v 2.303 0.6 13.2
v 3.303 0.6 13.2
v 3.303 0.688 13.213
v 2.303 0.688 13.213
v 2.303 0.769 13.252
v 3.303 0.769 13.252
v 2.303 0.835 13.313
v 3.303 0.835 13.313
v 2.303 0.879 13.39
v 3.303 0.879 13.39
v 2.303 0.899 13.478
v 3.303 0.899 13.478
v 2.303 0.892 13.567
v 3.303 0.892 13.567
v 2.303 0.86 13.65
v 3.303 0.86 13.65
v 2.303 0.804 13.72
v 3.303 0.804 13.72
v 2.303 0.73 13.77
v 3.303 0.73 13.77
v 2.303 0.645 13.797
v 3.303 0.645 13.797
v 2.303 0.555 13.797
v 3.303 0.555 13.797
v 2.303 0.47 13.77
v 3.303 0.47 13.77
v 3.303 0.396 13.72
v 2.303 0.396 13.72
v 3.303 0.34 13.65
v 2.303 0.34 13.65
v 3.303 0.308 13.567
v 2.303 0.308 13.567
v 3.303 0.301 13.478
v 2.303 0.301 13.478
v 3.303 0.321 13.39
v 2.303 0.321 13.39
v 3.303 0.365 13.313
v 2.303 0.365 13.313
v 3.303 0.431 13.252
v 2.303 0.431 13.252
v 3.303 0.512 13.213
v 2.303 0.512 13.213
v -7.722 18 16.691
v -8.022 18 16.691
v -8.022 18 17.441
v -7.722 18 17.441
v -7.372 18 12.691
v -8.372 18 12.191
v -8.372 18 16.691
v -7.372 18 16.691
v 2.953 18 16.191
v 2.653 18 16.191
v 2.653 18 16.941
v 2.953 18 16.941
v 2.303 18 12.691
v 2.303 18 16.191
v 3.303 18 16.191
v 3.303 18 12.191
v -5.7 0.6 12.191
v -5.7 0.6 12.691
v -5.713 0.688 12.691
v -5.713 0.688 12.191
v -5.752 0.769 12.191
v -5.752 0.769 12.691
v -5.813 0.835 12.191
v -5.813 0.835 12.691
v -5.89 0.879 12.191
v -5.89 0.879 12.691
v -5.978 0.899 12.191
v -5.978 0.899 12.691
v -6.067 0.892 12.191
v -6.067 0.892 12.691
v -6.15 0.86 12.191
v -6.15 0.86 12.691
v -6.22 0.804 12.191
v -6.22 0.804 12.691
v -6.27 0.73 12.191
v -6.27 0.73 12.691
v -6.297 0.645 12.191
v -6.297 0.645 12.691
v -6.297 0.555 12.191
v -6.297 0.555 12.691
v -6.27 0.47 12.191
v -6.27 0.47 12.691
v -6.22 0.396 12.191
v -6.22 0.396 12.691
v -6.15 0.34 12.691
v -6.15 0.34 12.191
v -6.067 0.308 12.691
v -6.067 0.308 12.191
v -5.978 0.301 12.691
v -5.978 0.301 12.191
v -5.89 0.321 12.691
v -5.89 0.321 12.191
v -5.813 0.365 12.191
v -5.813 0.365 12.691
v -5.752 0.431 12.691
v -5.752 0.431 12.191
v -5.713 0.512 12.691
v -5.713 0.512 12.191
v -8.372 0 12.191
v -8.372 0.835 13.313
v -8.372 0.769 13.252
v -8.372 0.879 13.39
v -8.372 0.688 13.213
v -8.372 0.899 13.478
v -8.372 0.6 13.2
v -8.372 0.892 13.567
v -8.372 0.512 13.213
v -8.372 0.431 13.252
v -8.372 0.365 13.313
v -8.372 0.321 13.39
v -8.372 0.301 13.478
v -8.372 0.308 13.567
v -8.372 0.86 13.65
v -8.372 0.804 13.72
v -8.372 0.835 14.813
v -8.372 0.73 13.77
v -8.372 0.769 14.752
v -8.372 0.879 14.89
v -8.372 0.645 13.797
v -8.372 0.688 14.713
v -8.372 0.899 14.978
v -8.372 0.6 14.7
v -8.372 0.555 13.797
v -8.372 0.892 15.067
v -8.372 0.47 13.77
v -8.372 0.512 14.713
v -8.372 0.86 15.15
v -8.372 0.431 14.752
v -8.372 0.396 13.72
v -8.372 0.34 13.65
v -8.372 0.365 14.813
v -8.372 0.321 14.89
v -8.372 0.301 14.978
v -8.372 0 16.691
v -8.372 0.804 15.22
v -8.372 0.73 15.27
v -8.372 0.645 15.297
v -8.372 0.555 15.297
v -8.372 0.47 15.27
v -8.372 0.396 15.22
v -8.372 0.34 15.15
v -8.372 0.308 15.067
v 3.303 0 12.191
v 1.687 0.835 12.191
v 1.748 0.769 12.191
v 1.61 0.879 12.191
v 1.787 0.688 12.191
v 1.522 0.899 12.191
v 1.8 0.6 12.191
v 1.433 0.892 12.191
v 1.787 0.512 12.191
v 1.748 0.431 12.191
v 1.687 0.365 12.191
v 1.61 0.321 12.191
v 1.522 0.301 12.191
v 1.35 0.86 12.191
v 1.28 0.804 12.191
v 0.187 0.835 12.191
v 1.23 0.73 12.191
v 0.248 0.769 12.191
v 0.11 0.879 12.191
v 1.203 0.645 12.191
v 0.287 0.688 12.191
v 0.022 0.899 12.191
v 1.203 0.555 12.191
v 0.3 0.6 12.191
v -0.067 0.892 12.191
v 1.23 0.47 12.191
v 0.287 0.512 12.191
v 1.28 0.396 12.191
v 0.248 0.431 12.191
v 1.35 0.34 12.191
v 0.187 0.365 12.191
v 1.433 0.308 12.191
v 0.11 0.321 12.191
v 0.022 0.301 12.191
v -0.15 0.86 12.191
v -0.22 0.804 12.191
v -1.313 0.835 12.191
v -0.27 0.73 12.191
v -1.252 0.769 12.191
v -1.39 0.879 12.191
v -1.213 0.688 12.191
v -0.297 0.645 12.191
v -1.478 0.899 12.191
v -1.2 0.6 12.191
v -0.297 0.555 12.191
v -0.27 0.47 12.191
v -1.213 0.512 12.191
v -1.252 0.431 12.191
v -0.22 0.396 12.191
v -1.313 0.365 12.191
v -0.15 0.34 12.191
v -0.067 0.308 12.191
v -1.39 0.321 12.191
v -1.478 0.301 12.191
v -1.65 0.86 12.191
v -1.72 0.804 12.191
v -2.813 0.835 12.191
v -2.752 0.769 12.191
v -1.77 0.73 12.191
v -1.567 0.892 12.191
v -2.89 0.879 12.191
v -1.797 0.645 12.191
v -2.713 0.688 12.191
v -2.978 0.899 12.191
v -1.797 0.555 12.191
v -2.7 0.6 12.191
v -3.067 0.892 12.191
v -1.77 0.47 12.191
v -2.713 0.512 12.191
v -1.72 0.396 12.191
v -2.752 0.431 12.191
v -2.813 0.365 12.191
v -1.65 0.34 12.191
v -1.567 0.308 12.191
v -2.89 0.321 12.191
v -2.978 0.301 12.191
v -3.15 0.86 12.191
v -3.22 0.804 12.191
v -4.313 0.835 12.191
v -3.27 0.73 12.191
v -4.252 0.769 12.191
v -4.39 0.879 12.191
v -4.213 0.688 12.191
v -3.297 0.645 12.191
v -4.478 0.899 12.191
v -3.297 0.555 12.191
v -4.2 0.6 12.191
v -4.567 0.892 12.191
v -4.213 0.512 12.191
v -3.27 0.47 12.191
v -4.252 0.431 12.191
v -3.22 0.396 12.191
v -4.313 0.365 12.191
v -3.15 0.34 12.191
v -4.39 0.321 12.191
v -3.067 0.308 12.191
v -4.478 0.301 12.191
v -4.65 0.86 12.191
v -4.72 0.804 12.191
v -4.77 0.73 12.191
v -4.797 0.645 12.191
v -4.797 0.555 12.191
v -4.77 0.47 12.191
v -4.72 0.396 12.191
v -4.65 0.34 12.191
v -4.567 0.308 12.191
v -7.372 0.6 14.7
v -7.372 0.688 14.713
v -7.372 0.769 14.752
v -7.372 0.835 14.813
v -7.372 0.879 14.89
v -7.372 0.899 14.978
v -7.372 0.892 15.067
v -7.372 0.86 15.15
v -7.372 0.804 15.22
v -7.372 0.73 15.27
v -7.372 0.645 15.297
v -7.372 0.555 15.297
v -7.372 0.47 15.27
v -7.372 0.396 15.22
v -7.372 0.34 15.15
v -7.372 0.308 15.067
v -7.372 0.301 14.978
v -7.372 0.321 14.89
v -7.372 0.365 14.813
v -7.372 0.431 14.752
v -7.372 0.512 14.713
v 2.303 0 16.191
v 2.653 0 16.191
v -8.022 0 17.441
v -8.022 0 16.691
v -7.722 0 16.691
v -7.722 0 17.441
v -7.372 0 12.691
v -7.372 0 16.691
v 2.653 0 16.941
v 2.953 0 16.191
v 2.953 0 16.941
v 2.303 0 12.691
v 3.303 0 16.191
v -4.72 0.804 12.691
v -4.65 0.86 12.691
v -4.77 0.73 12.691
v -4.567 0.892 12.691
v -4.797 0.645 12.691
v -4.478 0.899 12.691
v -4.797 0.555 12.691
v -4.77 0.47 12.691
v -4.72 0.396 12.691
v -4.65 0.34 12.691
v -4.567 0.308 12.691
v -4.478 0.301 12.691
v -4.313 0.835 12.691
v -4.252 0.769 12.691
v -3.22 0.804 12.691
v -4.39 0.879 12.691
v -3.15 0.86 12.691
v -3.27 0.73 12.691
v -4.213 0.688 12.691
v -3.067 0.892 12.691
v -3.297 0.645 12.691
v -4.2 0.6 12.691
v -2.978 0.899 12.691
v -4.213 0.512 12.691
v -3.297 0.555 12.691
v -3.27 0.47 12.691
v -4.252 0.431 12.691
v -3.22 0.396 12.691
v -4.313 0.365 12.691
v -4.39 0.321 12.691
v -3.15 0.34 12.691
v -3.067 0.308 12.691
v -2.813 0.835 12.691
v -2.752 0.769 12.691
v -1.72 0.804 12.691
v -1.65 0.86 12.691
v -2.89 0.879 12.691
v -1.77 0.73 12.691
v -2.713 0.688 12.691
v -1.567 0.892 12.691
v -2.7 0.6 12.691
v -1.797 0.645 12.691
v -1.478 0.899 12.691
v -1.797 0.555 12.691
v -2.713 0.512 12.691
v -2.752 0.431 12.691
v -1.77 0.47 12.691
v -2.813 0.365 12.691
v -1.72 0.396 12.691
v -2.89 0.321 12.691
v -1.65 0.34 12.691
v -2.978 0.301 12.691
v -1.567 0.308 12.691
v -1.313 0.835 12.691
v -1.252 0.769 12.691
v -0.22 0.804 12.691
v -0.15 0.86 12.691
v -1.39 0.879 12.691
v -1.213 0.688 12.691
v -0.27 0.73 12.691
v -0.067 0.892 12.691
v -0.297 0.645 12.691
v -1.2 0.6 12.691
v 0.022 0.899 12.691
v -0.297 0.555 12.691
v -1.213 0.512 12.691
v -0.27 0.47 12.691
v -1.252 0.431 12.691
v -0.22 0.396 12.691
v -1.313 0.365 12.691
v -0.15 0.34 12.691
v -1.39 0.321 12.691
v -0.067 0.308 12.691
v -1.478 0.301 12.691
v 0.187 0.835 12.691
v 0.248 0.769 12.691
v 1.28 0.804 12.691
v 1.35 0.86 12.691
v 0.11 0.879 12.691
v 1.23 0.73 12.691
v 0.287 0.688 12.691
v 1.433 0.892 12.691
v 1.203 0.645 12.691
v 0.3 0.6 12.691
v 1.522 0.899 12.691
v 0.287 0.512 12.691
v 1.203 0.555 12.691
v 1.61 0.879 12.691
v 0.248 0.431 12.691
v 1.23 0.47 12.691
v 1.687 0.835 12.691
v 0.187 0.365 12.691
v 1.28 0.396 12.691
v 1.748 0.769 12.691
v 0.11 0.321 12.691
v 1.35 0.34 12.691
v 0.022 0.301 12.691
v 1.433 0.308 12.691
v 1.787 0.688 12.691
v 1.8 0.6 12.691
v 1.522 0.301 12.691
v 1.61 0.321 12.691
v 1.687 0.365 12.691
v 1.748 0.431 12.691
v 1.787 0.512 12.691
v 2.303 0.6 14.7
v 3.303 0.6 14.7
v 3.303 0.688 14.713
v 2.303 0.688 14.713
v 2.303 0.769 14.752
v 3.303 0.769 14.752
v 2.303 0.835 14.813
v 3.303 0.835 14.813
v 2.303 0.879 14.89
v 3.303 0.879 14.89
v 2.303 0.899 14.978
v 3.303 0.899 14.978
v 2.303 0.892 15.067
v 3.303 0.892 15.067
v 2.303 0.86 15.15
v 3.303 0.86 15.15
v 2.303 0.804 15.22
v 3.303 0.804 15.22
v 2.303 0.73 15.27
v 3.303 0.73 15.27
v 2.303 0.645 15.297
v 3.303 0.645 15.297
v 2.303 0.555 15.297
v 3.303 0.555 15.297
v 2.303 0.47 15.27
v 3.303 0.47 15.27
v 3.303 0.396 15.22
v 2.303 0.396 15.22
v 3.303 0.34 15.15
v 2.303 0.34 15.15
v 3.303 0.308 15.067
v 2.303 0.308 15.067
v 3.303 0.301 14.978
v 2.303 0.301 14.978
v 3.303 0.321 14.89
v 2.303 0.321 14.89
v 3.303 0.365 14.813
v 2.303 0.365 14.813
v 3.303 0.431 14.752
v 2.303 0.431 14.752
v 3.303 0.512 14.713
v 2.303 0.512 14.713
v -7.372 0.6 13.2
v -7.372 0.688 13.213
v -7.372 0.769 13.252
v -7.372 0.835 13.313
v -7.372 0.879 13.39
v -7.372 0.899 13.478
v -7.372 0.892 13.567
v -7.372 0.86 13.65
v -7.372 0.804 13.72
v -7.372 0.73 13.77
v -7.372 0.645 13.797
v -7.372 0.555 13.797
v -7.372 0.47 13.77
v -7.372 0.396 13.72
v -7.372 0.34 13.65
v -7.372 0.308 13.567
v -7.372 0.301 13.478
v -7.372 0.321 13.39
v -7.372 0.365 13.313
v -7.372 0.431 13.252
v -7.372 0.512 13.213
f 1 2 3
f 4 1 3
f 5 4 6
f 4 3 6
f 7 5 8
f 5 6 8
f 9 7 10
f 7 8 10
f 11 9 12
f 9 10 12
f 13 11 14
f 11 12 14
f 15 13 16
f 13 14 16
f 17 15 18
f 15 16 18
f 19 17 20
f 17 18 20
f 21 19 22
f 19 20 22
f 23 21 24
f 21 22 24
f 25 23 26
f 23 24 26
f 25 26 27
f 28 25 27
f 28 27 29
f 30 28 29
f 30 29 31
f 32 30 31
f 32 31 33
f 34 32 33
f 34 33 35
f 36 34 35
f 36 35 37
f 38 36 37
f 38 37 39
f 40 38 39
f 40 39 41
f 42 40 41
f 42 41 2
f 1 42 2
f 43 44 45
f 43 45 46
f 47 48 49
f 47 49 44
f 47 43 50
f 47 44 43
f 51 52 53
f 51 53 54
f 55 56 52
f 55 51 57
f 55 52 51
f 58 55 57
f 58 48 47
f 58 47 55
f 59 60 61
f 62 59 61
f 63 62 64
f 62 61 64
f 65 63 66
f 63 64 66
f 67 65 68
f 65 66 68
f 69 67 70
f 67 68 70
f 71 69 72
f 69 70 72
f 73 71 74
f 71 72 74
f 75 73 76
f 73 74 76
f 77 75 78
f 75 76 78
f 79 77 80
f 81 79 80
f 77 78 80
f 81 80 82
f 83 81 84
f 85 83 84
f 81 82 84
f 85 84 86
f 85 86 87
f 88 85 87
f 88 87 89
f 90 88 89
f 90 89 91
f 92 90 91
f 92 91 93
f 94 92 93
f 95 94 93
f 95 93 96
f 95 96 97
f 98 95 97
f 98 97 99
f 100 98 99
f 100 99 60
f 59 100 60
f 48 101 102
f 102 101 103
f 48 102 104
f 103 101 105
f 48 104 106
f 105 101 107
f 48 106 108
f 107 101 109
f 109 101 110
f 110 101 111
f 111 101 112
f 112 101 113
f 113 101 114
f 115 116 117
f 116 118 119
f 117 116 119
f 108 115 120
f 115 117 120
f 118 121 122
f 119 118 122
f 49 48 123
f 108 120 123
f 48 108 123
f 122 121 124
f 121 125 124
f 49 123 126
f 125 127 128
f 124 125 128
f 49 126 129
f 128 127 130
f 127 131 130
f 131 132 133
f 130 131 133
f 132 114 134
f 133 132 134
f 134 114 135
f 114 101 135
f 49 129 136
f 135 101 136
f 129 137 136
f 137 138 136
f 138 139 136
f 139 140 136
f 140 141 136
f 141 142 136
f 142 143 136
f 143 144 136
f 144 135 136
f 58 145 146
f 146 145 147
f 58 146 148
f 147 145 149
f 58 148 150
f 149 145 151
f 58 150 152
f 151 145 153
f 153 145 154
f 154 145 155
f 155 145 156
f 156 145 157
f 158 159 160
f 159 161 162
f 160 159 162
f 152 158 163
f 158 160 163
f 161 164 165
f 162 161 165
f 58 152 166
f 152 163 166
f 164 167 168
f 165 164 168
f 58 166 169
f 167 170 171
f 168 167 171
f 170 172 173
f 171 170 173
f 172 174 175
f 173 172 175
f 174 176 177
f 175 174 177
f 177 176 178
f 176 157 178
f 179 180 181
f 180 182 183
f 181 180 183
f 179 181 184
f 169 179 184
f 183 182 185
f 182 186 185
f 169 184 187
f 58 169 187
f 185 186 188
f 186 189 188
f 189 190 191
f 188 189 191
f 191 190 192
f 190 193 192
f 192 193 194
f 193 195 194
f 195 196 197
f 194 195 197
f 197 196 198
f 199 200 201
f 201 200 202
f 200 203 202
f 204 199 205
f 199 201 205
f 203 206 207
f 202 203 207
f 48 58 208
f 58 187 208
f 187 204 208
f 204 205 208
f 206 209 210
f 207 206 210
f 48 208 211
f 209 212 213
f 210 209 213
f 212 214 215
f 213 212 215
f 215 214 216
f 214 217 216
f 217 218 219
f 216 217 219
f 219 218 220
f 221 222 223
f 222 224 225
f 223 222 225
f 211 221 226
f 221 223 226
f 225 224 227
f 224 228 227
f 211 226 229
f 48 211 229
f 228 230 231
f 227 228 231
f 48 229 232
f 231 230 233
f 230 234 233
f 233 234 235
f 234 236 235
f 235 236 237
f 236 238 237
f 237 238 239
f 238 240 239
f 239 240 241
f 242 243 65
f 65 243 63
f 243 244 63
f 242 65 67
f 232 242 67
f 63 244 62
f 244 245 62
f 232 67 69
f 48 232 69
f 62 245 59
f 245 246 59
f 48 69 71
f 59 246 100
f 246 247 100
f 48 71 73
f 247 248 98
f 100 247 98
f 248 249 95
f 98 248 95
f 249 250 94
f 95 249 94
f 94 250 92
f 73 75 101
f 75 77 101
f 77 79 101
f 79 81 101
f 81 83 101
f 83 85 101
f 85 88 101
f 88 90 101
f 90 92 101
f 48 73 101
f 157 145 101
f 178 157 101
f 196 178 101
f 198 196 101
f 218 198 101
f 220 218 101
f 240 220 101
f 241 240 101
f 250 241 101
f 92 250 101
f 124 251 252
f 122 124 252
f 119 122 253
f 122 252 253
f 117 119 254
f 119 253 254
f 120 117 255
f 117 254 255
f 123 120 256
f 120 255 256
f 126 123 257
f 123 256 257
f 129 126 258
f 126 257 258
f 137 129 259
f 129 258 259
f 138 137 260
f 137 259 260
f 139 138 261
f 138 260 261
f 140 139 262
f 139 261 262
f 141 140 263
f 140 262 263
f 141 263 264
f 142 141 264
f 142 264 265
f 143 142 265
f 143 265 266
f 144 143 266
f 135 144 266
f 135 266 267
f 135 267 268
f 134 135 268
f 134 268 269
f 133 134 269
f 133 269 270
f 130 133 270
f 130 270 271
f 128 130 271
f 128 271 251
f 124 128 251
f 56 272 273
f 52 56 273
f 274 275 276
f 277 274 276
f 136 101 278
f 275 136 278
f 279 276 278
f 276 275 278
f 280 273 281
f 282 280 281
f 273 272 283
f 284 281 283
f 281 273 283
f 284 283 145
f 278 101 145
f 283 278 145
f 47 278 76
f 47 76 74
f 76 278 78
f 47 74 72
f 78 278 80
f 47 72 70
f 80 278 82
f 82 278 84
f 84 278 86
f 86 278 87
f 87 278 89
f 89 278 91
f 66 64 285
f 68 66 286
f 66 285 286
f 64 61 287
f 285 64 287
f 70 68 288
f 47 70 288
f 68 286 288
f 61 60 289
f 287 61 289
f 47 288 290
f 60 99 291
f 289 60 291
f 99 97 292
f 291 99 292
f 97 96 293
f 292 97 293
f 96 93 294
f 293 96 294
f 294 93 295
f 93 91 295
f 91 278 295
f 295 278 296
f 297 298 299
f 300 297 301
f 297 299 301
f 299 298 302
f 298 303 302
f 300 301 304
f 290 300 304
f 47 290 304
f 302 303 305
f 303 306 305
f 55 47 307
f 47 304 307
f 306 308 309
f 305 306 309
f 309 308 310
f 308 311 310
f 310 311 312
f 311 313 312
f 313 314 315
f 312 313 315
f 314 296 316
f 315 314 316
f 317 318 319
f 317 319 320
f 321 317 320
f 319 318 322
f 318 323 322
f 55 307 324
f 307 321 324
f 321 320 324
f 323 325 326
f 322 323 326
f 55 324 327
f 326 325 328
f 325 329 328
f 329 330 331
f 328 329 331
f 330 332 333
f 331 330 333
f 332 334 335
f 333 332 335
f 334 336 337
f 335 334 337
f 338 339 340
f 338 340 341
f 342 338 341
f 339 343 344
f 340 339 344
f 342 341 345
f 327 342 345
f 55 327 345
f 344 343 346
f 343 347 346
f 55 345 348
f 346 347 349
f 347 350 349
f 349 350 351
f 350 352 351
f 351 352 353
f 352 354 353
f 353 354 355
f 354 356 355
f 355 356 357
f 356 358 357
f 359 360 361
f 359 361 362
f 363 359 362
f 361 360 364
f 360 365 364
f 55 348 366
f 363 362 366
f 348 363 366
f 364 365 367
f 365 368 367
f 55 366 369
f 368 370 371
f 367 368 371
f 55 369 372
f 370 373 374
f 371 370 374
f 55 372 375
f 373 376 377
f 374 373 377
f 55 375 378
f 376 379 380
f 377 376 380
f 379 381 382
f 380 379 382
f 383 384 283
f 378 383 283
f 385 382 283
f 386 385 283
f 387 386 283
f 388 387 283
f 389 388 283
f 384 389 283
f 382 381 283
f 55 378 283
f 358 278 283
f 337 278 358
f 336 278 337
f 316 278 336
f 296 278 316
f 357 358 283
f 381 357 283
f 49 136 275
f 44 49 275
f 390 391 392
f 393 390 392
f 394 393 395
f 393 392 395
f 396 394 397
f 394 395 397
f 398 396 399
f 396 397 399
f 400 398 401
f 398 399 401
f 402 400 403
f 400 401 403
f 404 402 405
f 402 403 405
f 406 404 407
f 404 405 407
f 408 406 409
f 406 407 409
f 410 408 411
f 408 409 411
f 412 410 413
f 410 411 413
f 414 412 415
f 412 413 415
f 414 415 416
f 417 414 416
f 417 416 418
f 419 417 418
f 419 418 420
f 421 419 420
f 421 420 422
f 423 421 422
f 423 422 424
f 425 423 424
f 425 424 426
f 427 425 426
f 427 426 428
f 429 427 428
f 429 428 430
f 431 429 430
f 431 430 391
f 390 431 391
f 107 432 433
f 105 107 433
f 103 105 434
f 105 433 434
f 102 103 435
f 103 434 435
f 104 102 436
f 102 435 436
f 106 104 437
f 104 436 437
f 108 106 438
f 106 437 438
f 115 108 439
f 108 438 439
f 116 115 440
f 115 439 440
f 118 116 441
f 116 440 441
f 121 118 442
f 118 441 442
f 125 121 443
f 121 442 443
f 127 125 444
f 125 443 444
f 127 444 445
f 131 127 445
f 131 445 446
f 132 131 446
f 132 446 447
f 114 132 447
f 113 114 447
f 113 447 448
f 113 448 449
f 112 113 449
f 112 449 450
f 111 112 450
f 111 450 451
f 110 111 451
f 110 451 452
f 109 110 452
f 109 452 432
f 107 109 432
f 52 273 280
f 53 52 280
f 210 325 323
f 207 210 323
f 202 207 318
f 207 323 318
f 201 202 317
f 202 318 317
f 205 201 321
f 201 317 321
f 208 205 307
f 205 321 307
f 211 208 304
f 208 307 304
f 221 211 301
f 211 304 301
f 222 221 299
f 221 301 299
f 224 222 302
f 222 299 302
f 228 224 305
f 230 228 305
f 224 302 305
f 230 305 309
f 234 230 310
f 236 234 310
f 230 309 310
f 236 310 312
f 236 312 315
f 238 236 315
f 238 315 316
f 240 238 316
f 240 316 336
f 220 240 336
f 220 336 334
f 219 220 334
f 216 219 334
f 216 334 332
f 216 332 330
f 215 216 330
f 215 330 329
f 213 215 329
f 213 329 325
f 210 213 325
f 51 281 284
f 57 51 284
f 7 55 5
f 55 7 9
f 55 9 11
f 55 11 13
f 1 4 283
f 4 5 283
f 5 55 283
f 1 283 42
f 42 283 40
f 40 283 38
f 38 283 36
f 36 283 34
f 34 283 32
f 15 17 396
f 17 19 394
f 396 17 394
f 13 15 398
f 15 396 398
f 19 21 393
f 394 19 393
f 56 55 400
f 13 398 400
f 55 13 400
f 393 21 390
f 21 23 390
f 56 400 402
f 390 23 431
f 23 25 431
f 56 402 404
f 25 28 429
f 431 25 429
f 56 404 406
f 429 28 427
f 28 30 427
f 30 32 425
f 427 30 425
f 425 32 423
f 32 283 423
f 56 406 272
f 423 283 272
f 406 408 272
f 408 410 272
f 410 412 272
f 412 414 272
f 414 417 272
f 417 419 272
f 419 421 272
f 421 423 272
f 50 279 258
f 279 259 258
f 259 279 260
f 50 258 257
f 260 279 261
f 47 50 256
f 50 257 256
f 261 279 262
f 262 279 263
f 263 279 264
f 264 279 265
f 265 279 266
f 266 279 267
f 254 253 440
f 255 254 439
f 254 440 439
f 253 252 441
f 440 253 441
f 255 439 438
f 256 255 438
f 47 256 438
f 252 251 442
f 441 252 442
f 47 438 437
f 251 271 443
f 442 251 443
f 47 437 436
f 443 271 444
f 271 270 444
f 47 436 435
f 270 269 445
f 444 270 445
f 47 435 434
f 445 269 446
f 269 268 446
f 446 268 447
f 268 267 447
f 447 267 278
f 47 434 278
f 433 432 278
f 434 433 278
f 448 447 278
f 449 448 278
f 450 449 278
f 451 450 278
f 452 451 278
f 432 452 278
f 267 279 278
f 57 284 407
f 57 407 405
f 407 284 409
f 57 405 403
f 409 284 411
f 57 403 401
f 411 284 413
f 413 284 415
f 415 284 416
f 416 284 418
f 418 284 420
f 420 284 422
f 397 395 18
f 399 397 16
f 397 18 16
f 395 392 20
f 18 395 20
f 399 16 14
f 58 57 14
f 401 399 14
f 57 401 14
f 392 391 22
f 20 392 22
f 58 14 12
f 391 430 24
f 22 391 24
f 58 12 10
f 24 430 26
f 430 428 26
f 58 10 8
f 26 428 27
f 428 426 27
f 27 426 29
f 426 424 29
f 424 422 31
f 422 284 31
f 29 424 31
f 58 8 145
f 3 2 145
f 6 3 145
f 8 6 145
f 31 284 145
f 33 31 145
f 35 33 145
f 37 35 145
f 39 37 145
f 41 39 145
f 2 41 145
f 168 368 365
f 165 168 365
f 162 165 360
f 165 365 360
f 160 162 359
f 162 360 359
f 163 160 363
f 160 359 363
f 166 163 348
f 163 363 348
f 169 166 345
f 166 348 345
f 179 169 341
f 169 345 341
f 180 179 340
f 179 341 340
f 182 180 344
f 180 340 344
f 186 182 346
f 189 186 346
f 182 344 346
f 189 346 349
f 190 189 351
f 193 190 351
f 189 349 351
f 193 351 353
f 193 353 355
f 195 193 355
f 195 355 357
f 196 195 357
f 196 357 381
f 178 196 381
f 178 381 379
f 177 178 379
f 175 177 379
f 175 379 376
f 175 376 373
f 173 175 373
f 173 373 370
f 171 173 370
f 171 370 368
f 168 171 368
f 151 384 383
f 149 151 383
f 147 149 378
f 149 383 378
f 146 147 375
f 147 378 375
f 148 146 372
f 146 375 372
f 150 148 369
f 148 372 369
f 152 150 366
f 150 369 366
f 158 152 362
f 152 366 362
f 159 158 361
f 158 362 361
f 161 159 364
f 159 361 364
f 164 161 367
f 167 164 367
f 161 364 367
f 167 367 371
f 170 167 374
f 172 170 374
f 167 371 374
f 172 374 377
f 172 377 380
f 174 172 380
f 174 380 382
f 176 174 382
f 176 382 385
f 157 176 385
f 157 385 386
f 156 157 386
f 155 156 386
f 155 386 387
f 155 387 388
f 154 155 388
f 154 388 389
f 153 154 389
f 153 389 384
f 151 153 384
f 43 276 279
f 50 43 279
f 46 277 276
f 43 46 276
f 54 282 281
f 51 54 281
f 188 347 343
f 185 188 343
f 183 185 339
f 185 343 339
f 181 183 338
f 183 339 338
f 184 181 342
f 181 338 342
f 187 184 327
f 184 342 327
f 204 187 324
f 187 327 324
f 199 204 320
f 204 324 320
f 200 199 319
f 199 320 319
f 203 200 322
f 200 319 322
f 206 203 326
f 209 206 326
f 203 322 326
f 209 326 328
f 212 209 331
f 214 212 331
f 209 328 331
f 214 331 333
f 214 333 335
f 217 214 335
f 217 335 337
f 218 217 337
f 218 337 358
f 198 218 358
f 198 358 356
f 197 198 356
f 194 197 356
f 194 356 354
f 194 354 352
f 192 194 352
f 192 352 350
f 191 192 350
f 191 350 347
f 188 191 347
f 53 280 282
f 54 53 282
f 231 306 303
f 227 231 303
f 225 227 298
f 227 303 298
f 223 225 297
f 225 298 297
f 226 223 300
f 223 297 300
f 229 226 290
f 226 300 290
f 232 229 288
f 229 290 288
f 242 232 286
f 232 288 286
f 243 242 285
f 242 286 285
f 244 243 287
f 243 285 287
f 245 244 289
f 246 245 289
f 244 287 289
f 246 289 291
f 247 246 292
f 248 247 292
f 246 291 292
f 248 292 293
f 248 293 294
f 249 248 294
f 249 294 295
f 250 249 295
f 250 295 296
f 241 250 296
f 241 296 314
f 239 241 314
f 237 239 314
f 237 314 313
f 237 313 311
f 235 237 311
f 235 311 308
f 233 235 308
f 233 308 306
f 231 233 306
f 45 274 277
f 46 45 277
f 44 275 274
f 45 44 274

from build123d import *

# Parameters (mm, degrees)
BOSS_EXTRUDE1_DEPTH = 18
SKETCH5_R           = 0.3
CUT_EXTRUDE1_DEPTH  = 1.5
SKETCH6_R           = 0.3
CUT_EXTRUDE2_DEPTH  = 12.675000001


with BuildPart() as part:
    # Sketch1 → Boss-Extrude1 (new body)
    with BuildSketch(Plane(origin=(0, 0, 0), x_dir=(1, 0, 0), z_dir=(0, 1, 0))):
        Polygon((-8.372296156, -12.19086985), (-8.372296156, -16.69086985), (-8.022296156, -16.69086985), (-8.022296156, -17.44086985), (-7.722296156, -17.44086985), (-7.722296156, -16.69086985), (-7.372296156, -16.69086985), (-7.372296156, -12.69086985), (2.302703845, -12.69086985), (2.302703845, -16.19086985), (2.652703845, -16.19086985), (2.652703845, -16.94086985), (2.952703845, -16.94086985), (2.952703845, -16.19086985), (3.302703845, -16.19086985), (3.302703845, -12.19086985), align=None)
    extrude(amount=BOSS_EXTRUDE1_DEPTH)

    # Sketch5 → Cut-Extrude1 (cut, through all)
    with BuildSketch(Plane.XY.offset(12.69086985)):
        with Locations((-6, 0.6)):
            Circle(SKETCH5_R)
        with Locations((-4.5, 0.6)):
            Circle(SKETCH5_R)
        with Locations((-3, 0.6)):
            Circle(SKETCH5_R)
        with Locations((-1.5, 0.6)):
            Circle(SKETCH5_R)
        with Locations((1.5, 0.6)):
            Circle(SKETCH5_R)
        with Locations((0, 0.6)):
            Circle(SKETCH5_R)
    extrude(amount=-CUT_EXTRUDE1_DEPTH, mode=Mode.SUBTRACT)

    # Sketch6 → Cut-Extrude2 (cut, through all)
    with BuildSketch(Plane(origin=(3.302703845, 0, 0), x_dir=(0, 0, -1), z_dir=(1, 0, 0))):
        with Locations((-15, 0.6)):
            Circle(SKETCH6_R)
        with Locations((-13.5, 0.6)):
            Circle(SKETCH6_R)
    extrude(amount=-CUT_EXTRUDE2_DEPTH, mode=Mode.SUBTRACT)


solid = part.part
